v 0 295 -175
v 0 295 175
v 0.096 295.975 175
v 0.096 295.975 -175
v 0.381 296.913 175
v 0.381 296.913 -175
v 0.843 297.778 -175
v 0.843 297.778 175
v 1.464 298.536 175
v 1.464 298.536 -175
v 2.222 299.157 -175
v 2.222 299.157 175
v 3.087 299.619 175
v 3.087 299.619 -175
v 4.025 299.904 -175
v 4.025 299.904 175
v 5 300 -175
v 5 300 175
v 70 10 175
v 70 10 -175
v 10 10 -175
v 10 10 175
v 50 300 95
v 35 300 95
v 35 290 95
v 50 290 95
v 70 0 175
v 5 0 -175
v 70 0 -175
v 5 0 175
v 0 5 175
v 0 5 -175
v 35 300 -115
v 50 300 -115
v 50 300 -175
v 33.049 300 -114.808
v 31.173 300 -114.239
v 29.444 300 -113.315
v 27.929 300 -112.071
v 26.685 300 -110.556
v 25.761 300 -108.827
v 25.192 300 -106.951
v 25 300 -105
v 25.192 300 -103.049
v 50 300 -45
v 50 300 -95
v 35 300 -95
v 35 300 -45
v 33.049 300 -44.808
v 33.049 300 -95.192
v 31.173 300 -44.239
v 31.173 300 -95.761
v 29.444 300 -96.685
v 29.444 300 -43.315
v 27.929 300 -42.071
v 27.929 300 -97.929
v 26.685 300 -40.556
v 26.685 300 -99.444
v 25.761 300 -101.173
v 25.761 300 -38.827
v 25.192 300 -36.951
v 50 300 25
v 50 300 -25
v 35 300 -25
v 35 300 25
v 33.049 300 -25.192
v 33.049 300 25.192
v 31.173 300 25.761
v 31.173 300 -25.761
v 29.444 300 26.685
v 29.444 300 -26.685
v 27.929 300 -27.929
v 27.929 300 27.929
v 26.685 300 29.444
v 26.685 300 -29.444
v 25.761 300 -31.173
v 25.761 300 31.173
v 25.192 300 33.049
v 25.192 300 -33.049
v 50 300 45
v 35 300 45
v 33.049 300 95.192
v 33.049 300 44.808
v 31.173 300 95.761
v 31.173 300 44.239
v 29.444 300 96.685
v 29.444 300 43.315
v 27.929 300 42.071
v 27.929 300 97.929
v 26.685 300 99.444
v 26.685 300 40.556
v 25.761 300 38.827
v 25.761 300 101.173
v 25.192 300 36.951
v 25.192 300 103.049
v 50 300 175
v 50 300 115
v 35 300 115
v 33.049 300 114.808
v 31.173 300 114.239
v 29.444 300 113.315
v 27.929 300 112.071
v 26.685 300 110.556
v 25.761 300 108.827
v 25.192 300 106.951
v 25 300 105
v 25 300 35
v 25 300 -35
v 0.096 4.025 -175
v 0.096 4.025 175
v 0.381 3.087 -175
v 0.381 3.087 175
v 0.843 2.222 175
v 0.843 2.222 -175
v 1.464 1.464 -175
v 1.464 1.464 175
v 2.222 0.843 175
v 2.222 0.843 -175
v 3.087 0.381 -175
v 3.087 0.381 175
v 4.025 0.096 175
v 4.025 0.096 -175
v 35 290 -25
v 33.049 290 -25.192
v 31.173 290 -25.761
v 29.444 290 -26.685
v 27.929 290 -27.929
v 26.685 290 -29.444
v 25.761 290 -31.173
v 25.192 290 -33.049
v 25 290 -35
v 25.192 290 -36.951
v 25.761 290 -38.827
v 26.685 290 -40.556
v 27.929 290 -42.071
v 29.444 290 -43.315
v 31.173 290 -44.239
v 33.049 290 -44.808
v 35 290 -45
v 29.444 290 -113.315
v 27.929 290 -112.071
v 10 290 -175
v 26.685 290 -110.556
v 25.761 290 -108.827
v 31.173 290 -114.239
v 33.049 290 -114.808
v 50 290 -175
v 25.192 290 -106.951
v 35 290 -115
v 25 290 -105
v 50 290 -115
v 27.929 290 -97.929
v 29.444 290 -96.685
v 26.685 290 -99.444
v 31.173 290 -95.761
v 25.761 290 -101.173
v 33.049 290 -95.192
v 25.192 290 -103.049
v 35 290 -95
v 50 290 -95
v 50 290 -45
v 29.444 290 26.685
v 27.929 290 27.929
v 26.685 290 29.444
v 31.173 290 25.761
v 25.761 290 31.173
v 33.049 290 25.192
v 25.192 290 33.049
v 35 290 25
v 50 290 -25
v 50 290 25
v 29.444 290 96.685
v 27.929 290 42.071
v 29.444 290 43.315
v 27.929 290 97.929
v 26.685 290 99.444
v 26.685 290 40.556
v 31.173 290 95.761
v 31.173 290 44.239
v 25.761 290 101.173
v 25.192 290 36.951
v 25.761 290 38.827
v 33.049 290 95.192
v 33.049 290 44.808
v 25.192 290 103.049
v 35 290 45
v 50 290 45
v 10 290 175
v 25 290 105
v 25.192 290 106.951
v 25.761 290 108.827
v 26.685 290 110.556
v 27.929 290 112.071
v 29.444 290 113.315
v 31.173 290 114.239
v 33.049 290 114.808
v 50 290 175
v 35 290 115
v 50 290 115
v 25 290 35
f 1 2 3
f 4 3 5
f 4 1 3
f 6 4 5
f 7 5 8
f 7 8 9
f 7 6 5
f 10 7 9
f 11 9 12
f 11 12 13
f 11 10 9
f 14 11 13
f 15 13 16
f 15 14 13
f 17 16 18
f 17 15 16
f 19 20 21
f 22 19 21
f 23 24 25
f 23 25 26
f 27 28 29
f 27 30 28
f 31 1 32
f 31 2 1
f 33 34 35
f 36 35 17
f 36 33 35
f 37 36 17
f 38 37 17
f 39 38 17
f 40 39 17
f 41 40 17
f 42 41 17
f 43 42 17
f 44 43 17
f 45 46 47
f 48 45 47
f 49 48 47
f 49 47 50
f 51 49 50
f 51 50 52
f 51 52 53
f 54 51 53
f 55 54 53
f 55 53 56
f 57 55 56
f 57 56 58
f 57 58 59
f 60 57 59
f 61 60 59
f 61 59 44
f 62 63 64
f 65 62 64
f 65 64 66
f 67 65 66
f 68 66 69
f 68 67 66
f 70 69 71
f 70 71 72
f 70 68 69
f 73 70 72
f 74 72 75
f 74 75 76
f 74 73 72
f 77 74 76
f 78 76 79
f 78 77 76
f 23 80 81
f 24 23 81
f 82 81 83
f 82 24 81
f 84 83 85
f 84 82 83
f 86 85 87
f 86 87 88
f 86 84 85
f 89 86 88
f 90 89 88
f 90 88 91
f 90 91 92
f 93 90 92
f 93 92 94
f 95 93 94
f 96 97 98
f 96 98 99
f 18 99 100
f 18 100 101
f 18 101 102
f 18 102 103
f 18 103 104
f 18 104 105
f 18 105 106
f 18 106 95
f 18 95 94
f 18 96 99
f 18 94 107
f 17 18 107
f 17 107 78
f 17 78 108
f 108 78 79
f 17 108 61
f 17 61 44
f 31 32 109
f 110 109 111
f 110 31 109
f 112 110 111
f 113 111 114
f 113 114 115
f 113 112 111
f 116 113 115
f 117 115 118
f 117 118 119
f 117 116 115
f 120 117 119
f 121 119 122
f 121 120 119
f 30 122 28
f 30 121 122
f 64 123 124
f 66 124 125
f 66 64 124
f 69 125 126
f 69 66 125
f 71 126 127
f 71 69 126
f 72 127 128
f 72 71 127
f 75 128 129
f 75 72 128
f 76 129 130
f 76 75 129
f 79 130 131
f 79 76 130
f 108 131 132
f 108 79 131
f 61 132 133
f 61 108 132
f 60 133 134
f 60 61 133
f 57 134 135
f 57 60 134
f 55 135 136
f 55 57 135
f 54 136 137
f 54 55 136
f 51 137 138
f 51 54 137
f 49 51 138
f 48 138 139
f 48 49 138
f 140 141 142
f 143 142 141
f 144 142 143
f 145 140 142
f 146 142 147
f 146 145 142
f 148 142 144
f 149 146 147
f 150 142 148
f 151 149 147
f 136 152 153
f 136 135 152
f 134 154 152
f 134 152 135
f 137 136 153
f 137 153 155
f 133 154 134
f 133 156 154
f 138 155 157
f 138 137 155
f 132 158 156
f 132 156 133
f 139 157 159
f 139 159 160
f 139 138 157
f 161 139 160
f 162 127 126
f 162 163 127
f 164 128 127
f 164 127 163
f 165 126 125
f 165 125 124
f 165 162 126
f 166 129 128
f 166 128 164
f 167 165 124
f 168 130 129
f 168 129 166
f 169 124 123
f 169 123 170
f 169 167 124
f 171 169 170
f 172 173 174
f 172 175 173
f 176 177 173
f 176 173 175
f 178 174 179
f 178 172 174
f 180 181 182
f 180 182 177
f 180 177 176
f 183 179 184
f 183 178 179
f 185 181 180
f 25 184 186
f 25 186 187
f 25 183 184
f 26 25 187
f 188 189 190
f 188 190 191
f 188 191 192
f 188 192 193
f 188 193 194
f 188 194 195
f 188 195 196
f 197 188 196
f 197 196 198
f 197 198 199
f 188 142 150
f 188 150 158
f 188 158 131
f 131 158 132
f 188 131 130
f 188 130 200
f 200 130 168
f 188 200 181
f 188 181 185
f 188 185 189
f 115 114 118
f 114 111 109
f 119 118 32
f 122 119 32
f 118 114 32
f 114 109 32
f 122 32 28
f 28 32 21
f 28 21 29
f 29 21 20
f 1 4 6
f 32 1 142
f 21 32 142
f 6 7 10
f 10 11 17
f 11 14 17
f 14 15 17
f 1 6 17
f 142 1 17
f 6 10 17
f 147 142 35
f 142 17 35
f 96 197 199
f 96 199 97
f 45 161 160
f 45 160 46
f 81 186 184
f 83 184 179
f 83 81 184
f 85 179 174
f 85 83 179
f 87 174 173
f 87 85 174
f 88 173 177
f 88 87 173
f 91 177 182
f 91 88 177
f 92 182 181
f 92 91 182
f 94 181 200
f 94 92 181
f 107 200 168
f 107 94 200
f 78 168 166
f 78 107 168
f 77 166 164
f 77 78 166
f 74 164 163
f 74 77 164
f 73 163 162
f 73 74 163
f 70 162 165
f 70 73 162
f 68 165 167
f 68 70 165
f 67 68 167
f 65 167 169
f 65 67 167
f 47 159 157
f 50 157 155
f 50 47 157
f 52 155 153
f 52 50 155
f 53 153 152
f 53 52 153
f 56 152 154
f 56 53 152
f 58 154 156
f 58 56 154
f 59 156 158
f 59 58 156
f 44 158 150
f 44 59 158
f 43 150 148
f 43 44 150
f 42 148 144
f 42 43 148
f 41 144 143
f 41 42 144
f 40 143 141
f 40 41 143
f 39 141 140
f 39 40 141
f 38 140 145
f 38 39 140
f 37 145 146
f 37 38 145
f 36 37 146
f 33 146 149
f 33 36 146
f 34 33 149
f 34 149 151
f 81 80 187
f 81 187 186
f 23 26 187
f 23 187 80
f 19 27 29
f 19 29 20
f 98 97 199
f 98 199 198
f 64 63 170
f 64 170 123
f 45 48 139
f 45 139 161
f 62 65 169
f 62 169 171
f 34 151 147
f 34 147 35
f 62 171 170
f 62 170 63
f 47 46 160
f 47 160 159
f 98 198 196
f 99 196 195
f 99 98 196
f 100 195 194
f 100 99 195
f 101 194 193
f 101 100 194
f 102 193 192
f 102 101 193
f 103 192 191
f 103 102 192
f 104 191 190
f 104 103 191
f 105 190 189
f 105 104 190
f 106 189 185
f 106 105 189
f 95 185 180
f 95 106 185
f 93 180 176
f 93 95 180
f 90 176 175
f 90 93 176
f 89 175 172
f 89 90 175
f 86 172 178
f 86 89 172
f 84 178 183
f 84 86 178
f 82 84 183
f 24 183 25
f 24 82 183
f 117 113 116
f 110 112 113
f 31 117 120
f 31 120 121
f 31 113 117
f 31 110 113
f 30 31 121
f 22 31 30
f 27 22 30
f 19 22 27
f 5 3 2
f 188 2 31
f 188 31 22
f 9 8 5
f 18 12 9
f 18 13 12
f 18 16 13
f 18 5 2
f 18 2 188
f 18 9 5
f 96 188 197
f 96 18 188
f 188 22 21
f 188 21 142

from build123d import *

# Parameters (mm, degrees)
BOSS_EXTRUDE1_DEPTH = 175
CUT_EXTRUDE1_REACH  = 356.295
LPATTERN1_COUNT     = 4
LPATTERN1_PITCH     = 70
FILLET1_R           = 5


with BuildPart() as part:
    # Sketch1 → Boss-Extrude1 (new, symmetric)
    with BuildSketch(Plane.XY):
        Polygon((0, 300), (0, 0), (70, 0), (70, 10), (10, 10), (10, 290), (50, 290), (50, 300), align=None)
    extrude(amount=BOSS_EXTRUDE1_DEPTH, both=True)

    # Sketch2 → Cut-Extrude1 (cut, up to next)
    with BuildSketch(Plane(origin=(0, 300, 0), x_dir=(1, 0, 0), z_dir=(0, 1, 0)), mode=Mode.PRIVATE) as cut_extrude1_sk1:
        with BuildLine():
            Line((35, 115), (50, 115))
            Line((50, 115), (50, 95))
            Line((50, 95), (35, 95))
            ThreePointArc((35, 95), (25, 105), (35, 115))
        make_face()
    cut_extrude1_tool1 = extrude(cut_extrude1_sk1.sketch, amount=-CUT_EXTRUDE1_REACH, mode=Mode.PRIVATE) & part.part
    cut_extrude1 = cut_extrude1_tool1.solids().sort_by_distance((38.464021, 300, -105))[0]
    add(cut_extrude1, mode=Mode.SUBTRACT)

    # LPattern1: Cut-Extrude1 ×4
    with Locations(*[(0, 0, i * LPATTERN1_PITCH) for i in range(1, LPATTERN1_COUNT)]):
        add(cut_extrude1, mode=Mode.SUBTRACT)

    # Fillet1
    fillet1_edges = [part.edges().sort_by_distance(p)[0] for p in [
        (0, 0, 0),
        (0, 300, 0),
    ]]
    fillet(fillet1_edges, radius=FILLET1_R)


solid = part.part
